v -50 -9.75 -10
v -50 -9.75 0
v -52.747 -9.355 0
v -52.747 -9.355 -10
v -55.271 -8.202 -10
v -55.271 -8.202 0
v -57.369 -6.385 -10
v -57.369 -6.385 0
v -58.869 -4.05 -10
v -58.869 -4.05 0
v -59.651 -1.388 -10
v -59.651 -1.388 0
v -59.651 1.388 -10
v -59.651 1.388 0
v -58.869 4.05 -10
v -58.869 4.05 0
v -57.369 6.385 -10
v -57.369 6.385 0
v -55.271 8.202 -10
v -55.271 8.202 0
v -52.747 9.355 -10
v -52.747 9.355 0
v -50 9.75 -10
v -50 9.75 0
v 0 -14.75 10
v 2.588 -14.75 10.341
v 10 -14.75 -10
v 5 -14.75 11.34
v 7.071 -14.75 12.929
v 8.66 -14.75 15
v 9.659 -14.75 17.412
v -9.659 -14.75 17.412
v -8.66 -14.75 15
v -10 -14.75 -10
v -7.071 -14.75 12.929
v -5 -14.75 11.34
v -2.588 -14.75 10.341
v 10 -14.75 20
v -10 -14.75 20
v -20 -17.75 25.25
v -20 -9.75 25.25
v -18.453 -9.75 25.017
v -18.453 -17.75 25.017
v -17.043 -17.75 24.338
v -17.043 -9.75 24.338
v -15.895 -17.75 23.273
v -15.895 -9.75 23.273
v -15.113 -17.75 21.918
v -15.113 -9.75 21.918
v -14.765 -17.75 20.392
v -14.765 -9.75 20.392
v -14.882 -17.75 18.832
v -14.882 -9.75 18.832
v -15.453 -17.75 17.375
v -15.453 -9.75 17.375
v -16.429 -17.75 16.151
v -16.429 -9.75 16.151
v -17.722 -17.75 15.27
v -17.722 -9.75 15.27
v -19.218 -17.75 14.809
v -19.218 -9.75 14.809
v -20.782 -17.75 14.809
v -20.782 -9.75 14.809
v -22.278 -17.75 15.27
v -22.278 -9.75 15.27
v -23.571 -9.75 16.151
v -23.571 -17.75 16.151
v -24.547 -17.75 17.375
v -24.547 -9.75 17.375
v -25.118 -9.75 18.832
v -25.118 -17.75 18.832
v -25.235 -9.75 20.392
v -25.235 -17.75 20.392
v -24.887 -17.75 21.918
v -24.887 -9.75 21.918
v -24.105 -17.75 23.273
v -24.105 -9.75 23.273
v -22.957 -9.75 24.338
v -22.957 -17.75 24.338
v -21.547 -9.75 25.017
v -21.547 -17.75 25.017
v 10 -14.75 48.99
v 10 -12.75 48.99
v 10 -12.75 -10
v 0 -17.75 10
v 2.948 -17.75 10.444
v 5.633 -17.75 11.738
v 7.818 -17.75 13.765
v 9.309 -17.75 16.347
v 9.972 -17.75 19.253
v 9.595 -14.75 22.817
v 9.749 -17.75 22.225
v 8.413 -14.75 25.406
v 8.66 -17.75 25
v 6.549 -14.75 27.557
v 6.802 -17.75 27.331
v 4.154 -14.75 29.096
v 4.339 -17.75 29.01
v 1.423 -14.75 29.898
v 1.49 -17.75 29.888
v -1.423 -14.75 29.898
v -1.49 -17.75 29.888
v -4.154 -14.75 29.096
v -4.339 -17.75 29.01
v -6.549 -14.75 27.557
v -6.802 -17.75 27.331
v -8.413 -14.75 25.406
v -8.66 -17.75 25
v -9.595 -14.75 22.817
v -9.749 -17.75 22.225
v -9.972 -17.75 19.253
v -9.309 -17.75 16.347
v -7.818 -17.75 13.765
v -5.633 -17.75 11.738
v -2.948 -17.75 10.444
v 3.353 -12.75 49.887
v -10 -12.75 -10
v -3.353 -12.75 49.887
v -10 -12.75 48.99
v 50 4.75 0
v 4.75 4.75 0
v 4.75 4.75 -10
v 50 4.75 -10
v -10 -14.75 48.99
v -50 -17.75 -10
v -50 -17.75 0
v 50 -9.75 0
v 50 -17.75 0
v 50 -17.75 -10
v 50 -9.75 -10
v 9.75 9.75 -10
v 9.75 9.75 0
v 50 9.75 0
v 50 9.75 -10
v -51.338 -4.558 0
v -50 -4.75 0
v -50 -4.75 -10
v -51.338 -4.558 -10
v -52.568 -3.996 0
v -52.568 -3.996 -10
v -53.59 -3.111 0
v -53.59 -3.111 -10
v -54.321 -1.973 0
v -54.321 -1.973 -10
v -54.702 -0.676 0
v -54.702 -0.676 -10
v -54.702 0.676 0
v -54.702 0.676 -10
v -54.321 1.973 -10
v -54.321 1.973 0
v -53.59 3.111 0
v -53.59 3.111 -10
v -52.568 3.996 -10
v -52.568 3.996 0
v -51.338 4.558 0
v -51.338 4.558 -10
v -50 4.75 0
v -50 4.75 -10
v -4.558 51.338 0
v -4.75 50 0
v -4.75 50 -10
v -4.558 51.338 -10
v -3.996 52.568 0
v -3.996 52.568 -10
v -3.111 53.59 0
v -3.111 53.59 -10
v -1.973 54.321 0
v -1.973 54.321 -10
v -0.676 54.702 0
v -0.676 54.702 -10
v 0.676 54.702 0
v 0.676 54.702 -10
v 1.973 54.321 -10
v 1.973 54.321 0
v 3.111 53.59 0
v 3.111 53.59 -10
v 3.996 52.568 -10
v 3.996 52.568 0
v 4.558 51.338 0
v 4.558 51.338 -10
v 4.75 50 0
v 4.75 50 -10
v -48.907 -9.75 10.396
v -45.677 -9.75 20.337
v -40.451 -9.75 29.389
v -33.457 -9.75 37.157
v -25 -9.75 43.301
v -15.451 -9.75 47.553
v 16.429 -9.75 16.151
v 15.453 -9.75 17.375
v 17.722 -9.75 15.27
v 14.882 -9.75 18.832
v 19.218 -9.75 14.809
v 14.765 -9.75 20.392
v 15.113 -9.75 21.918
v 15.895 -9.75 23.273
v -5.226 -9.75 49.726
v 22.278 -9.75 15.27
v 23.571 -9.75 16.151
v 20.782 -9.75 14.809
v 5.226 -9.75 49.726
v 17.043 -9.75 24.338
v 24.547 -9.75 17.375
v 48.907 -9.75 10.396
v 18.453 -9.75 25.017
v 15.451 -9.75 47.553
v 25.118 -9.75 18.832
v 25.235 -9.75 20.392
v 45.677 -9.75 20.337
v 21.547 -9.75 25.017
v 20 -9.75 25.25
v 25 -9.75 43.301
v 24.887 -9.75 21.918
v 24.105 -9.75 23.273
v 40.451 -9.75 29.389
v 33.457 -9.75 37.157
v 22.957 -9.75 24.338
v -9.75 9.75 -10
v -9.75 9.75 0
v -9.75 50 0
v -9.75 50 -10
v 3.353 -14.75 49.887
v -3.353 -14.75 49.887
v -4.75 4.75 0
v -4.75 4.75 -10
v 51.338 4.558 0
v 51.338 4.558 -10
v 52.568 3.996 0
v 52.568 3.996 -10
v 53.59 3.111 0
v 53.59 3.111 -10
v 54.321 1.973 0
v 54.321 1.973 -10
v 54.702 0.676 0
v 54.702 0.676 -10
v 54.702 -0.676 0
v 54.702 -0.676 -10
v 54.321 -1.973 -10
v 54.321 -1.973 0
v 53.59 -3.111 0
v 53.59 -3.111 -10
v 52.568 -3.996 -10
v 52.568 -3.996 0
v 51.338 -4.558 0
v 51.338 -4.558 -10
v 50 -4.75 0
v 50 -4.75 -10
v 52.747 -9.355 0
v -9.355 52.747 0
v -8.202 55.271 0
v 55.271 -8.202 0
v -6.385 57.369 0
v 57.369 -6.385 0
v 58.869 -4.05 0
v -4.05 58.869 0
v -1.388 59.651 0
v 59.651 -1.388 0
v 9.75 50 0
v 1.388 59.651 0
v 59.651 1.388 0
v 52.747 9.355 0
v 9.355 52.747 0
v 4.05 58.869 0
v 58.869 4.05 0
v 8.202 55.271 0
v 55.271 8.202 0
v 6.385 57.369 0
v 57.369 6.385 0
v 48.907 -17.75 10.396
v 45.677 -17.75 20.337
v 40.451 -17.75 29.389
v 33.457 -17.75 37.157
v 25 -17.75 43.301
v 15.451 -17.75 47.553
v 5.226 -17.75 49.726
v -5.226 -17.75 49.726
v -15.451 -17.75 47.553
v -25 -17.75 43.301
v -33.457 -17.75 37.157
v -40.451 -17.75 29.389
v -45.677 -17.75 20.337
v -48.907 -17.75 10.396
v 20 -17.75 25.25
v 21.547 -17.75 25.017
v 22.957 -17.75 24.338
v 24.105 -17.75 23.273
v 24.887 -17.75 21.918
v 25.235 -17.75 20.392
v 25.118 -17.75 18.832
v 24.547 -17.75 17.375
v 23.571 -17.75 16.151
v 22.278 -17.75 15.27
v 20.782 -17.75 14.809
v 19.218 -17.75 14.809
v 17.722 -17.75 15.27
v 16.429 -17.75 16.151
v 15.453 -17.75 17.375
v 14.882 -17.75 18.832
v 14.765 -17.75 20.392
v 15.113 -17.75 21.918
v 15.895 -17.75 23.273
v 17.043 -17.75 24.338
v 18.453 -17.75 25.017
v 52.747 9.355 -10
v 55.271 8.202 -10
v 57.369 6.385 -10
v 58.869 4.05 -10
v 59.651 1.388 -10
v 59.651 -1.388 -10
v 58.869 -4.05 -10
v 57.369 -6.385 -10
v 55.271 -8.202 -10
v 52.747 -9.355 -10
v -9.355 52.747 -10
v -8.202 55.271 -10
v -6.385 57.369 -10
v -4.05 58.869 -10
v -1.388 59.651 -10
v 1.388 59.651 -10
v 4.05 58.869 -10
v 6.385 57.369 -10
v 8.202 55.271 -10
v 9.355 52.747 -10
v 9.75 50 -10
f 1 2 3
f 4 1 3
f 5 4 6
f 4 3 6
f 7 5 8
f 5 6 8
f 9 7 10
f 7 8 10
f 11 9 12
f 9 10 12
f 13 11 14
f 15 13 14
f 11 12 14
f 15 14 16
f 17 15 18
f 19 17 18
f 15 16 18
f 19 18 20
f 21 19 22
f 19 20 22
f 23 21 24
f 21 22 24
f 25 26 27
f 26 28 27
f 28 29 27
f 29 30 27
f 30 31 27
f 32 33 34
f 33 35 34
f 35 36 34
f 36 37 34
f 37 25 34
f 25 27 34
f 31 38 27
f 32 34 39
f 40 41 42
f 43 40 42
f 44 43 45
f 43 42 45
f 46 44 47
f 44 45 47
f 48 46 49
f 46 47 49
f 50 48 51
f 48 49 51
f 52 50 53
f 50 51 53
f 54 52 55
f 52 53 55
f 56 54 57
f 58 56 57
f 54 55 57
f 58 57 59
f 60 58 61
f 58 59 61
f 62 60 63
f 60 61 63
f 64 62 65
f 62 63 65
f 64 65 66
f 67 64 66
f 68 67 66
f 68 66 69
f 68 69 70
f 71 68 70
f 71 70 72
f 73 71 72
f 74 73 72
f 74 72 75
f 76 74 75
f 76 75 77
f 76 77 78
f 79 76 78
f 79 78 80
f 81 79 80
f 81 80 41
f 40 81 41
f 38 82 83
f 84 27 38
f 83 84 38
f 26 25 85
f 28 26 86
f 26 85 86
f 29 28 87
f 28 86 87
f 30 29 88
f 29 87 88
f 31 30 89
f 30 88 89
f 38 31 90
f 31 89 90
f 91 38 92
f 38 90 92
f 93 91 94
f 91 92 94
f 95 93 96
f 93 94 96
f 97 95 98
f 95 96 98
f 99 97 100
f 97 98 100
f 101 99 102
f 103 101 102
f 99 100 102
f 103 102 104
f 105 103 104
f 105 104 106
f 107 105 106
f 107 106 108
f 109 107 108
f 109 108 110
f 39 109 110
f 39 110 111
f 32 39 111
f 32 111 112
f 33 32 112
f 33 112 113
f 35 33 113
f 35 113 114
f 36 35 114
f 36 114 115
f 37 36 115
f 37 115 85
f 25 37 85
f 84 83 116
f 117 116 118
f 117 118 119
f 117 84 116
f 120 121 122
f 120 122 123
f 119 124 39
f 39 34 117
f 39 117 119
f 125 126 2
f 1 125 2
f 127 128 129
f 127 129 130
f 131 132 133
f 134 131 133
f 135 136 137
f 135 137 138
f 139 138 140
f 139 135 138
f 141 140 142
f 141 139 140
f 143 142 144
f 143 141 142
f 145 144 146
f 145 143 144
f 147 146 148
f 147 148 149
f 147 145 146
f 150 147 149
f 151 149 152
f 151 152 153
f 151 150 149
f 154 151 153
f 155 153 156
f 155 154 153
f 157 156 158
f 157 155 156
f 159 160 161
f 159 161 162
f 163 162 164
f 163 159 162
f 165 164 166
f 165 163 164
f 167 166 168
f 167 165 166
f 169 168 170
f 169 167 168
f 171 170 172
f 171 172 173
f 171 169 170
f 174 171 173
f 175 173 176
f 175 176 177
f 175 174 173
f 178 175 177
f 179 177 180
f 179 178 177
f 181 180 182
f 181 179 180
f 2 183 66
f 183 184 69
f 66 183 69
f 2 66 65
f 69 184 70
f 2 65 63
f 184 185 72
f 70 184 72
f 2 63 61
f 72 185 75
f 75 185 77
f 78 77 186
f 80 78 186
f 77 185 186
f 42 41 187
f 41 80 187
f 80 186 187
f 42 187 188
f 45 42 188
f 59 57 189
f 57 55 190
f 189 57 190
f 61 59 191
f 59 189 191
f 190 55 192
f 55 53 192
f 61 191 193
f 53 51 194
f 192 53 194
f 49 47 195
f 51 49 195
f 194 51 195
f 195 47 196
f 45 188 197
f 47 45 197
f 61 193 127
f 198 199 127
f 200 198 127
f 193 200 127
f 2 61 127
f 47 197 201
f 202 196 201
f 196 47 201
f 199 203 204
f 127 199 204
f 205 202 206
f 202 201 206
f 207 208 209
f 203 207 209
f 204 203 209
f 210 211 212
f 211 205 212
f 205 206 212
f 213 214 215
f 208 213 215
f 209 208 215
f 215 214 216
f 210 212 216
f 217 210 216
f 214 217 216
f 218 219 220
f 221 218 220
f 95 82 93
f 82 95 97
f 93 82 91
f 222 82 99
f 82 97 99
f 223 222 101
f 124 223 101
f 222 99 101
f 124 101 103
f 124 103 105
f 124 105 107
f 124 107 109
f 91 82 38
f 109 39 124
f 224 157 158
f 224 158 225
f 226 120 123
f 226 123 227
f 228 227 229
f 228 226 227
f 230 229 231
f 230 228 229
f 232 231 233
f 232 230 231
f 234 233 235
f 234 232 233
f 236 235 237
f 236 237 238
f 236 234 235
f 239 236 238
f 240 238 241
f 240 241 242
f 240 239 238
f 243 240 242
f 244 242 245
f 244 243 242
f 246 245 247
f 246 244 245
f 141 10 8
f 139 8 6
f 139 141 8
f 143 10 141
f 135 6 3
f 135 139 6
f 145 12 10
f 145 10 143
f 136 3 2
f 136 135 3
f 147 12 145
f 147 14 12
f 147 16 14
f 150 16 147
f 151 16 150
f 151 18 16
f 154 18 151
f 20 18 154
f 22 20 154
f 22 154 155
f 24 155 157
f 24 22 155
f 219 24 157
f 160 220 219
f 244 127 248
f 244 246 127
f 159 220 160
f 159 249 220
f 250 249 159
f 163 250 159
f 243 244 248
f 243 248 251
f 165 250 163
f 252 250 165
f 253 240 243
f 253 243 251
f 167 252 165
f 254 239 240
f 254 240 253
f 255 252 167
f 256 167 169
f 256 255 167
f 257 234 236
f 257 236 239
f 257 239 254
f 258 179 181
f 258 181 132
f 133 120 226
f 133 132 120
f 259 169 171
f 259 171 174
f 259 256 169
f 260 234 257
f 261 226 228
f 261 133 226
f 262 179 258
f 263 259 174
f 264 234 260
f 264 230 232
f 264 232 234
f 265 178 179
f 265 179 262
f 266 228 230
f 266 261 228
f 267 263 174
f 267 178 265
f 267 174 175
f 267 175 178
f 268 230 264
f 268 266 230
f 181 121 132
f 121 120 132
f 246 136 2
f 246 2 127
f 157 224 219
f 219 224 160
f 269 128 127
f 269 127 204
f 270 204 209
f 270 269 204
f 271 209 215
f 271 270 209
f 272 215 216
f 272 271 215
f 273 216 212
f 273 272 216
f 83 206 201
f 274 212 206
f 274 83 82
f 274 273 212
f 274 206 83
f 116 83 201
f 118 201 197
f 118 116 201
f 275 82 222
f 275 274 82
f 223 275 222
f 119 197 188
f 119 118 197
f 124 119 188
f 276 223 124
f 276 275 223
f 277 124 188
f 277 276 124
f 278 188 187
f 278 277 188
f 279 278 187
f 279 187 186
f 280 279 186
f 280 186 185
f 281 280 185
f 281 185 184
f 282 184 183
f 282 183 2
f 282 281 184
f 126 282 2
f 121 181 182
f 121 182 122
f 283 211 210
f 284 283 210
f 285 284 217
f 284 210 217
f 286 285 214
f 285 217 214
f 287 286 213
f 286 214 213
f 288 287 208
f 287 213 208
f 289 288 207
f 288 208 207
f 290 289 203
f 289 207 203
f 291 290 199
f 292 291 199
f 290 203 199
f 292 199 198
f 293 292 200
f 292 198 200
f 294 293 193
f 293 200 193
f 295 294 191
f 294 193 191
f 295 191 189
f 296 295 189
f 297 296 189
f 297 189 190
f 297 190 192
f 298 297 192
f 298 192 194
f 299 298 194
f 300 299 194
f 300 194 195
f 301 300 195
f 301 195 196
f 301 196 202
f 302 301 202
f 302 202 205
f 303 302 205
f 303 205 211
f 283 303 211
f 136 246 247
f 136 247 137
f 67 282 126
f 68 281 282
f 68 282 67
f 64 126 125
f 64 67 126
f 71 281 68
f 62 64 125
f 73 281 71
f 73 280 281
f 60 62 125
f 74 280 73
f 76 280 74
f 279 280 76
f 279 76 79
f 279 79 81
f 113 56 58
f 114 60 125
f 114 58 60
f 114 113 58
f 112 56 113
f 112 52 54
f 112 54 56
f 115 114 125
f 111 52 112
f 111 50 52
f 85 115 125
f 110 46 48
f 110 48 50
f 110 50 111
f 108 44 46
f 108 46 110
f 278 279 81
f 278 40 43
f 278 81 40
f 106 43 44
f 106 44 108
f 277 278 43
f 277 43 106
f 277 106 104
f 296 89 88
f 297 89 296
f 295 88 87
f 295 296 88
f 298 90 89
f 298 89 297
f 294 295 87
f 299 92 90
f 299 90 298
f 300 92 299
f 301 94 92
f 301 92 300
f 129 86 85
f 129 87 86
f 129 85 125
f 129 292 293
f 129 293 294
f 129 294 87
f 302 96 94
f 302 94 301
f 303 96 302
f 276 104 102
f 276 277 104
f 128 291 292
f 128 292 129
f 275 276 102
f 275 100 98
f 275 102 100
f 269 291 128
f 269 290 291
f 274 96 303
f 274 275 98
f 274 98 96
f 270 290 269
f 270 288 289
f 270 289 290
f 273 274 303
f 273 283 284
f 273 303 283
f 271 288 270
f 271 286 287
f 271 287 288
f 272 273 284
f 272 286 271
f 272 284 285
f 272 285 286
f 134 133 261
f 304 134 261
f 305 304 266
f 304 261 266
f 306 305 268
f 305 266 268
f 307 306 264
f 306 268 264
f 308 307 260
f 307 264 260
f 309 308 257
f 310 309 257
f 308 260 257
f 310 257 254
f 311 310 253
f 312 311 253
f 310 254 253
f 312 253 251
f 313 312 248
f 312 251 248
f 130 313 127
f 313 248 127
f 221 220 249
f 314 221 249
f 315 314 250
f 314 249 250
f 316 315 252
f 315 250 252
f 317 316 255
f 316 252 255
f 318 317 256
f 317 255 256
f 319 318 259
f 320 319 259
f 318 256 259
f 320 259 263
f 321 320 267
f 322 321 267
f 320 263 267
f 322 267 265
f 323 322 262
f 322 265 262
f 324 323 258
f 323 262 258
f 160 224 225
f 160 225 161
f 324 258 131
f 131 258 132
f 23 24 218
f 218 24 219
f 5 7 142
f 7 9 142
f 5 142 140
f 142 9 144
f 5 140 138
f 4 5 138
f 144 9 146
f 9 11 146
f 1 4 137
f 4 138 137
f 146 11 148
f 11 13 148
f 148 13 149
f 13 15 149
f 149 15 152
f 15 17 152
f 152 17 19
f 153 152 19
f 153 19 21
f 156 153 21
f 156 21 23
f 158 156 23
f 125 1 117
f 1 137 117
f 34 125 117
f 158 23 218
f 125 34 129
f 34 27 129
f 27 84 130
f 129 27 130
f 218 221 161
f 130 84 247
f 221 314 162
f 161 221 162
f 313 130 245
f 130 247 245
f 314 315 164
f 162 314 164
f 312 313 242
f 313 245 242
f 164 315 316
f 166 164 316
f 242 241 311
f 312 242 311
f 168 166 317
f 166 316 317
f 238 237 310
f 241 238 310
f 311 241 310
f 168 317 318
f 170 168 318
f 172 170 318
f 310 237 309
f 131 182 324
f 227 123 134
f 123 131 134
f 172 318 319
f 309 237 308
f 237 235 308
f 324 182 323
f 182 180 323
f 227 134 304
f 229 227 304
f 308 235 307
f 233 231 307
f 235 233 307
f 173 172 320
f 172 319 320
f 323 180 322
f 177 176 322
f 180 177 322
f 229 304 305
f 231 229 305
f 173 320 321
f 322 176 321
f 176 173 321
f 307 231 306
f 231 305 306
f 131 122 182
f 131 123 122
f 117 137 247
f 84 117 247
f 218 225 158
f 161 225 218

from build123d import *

# Parameters (mm, degrees)
SKETCH1_W           = 100
SKETCH1_H           = 8
BOSS_EXTRUDE1_DEPTH = 10
BOSS_EXTRUDE2_DEPTH = 8
SKETCH3_R           = 5.25
CUT_EXTRUDE1_DEPTH  = 105.404561682
SKETCH4_W           = 20
SKETCH4_H           = 2
CUT_EXTRUDE2_DEPTH  = 104.634574347
SKETCH5_R           = 10
CUT_EXTRUDE3_DEPTH  = 3


with BuildPart() as part:
    # Sketch1 → Boss-Extrude1 (new body)
    # profile 1 of 2: a face of its own
    with BuildSketch(Plane.XY):
        with BuildLine():
            ThreePointArc((-9.75, 50), (0, 59.75), (9.75, 50))
            Line((9.75, 50), (9.75, 9.75))
            Line((9.75, 9.75), (50, 9.75))
            ThreePointArc((50, 9.75), (59.75, 0), (50, -9.75))
            Line((50, -9.75), (-50, -9.75))
            ThreePointArc((-50, -9.75), (-59.75, 0), (-50, 9.75))
            Line((-50, 9.75), (-9.75, 9.75))
            Line((-9.75, 9.75), (-9.75, 50))
        make_face()
        with BuildLine():
            Line((4.75, 4.75), (50, 4.75))
            ThreePointArc((50, 4.75), (54.75, 0), (50, -4.75))
            Line((50, -4.75), (-50, -4.75))
            ThreePointArc((-50, -4.75), (-54.75, 0), (-50, 4.75))
            Line((-50, 4.75), (-4.75, 4.75))
            Line((-4.75, 4.75), (-4.75, 50))
            ThreePointArc((-4.75, 50), (0, 54.75), (4.75, 50))
            Line((4.75, 50), (4.75, 4.75))
        make_face(mode=Mode.SUBTRACT)
    # profile 2 of 2: a face of its own
    with BuildSketch(Plane.XY):
        with Locations((0, -13.75)):
            Rectangle(SKETCH1_W, SKETCH1_H)
    extrude(amount=-BOSS_EXTRUDE1_DEPTH)

    # Sketch2 → Boss-Extrude2 (add)
    with BuildSketch(Plane.XZ.offset(17.75)):
        with BuildLine():
            Line((-50, 0), (50, 0))
            ThreePointArc((50, 0), (0, 50), (-50, 0))
        make_face()
    extrude(amount=-BOSS_EXTRUDE2_DEPTH)

    # Sketch3 → Cut-Extrude1 (cut, through all)
    with BuildSketch(Plane(origin=(0, -9.75, 0), x_dir=(1, 0, 0), z_dir=(0, 1, 0))):
        with Locations(Location((20, -20, 0), (0, 0, 270))):
            Circle(SKETCH3_R)
        with Locations(Location((-20, -20, 0), (0, 0, 270))):
            Circle(SKETCH3_R)
    extrude(amount=-CUT_EXTRUDE1_DEPTH, mode=Mode.SUBTRACT)

    # Sketch4 → Cut-Extrude2 (cut, through all)
    with BuildSketch(Plane(origin=(0, 0, -10), x_dir=(-1, 0, 0), z_dir=(0, 0, -1))):
        with Locations((0, -13.75)):
            Rectangle(SKETCH4_W, SKETCH4_H)
    extrude(amount=-CUT_EXTRUDE2_DEPTH, mode=Mode.SUBTRACT)

    # Sketch5 → Cut-Extrude3 (cut)
    with BuildSketch(Plane.XZ.offset(17.75)):
        with Locations(Location((0, 20, 0), (0, 0, 270))):
            Circle(SKETCH5_R)
    extrude(amount=-CUT_EXTRUDE3_DEPTH, mode=Mode.SUBTRACT)


solid = part.part
